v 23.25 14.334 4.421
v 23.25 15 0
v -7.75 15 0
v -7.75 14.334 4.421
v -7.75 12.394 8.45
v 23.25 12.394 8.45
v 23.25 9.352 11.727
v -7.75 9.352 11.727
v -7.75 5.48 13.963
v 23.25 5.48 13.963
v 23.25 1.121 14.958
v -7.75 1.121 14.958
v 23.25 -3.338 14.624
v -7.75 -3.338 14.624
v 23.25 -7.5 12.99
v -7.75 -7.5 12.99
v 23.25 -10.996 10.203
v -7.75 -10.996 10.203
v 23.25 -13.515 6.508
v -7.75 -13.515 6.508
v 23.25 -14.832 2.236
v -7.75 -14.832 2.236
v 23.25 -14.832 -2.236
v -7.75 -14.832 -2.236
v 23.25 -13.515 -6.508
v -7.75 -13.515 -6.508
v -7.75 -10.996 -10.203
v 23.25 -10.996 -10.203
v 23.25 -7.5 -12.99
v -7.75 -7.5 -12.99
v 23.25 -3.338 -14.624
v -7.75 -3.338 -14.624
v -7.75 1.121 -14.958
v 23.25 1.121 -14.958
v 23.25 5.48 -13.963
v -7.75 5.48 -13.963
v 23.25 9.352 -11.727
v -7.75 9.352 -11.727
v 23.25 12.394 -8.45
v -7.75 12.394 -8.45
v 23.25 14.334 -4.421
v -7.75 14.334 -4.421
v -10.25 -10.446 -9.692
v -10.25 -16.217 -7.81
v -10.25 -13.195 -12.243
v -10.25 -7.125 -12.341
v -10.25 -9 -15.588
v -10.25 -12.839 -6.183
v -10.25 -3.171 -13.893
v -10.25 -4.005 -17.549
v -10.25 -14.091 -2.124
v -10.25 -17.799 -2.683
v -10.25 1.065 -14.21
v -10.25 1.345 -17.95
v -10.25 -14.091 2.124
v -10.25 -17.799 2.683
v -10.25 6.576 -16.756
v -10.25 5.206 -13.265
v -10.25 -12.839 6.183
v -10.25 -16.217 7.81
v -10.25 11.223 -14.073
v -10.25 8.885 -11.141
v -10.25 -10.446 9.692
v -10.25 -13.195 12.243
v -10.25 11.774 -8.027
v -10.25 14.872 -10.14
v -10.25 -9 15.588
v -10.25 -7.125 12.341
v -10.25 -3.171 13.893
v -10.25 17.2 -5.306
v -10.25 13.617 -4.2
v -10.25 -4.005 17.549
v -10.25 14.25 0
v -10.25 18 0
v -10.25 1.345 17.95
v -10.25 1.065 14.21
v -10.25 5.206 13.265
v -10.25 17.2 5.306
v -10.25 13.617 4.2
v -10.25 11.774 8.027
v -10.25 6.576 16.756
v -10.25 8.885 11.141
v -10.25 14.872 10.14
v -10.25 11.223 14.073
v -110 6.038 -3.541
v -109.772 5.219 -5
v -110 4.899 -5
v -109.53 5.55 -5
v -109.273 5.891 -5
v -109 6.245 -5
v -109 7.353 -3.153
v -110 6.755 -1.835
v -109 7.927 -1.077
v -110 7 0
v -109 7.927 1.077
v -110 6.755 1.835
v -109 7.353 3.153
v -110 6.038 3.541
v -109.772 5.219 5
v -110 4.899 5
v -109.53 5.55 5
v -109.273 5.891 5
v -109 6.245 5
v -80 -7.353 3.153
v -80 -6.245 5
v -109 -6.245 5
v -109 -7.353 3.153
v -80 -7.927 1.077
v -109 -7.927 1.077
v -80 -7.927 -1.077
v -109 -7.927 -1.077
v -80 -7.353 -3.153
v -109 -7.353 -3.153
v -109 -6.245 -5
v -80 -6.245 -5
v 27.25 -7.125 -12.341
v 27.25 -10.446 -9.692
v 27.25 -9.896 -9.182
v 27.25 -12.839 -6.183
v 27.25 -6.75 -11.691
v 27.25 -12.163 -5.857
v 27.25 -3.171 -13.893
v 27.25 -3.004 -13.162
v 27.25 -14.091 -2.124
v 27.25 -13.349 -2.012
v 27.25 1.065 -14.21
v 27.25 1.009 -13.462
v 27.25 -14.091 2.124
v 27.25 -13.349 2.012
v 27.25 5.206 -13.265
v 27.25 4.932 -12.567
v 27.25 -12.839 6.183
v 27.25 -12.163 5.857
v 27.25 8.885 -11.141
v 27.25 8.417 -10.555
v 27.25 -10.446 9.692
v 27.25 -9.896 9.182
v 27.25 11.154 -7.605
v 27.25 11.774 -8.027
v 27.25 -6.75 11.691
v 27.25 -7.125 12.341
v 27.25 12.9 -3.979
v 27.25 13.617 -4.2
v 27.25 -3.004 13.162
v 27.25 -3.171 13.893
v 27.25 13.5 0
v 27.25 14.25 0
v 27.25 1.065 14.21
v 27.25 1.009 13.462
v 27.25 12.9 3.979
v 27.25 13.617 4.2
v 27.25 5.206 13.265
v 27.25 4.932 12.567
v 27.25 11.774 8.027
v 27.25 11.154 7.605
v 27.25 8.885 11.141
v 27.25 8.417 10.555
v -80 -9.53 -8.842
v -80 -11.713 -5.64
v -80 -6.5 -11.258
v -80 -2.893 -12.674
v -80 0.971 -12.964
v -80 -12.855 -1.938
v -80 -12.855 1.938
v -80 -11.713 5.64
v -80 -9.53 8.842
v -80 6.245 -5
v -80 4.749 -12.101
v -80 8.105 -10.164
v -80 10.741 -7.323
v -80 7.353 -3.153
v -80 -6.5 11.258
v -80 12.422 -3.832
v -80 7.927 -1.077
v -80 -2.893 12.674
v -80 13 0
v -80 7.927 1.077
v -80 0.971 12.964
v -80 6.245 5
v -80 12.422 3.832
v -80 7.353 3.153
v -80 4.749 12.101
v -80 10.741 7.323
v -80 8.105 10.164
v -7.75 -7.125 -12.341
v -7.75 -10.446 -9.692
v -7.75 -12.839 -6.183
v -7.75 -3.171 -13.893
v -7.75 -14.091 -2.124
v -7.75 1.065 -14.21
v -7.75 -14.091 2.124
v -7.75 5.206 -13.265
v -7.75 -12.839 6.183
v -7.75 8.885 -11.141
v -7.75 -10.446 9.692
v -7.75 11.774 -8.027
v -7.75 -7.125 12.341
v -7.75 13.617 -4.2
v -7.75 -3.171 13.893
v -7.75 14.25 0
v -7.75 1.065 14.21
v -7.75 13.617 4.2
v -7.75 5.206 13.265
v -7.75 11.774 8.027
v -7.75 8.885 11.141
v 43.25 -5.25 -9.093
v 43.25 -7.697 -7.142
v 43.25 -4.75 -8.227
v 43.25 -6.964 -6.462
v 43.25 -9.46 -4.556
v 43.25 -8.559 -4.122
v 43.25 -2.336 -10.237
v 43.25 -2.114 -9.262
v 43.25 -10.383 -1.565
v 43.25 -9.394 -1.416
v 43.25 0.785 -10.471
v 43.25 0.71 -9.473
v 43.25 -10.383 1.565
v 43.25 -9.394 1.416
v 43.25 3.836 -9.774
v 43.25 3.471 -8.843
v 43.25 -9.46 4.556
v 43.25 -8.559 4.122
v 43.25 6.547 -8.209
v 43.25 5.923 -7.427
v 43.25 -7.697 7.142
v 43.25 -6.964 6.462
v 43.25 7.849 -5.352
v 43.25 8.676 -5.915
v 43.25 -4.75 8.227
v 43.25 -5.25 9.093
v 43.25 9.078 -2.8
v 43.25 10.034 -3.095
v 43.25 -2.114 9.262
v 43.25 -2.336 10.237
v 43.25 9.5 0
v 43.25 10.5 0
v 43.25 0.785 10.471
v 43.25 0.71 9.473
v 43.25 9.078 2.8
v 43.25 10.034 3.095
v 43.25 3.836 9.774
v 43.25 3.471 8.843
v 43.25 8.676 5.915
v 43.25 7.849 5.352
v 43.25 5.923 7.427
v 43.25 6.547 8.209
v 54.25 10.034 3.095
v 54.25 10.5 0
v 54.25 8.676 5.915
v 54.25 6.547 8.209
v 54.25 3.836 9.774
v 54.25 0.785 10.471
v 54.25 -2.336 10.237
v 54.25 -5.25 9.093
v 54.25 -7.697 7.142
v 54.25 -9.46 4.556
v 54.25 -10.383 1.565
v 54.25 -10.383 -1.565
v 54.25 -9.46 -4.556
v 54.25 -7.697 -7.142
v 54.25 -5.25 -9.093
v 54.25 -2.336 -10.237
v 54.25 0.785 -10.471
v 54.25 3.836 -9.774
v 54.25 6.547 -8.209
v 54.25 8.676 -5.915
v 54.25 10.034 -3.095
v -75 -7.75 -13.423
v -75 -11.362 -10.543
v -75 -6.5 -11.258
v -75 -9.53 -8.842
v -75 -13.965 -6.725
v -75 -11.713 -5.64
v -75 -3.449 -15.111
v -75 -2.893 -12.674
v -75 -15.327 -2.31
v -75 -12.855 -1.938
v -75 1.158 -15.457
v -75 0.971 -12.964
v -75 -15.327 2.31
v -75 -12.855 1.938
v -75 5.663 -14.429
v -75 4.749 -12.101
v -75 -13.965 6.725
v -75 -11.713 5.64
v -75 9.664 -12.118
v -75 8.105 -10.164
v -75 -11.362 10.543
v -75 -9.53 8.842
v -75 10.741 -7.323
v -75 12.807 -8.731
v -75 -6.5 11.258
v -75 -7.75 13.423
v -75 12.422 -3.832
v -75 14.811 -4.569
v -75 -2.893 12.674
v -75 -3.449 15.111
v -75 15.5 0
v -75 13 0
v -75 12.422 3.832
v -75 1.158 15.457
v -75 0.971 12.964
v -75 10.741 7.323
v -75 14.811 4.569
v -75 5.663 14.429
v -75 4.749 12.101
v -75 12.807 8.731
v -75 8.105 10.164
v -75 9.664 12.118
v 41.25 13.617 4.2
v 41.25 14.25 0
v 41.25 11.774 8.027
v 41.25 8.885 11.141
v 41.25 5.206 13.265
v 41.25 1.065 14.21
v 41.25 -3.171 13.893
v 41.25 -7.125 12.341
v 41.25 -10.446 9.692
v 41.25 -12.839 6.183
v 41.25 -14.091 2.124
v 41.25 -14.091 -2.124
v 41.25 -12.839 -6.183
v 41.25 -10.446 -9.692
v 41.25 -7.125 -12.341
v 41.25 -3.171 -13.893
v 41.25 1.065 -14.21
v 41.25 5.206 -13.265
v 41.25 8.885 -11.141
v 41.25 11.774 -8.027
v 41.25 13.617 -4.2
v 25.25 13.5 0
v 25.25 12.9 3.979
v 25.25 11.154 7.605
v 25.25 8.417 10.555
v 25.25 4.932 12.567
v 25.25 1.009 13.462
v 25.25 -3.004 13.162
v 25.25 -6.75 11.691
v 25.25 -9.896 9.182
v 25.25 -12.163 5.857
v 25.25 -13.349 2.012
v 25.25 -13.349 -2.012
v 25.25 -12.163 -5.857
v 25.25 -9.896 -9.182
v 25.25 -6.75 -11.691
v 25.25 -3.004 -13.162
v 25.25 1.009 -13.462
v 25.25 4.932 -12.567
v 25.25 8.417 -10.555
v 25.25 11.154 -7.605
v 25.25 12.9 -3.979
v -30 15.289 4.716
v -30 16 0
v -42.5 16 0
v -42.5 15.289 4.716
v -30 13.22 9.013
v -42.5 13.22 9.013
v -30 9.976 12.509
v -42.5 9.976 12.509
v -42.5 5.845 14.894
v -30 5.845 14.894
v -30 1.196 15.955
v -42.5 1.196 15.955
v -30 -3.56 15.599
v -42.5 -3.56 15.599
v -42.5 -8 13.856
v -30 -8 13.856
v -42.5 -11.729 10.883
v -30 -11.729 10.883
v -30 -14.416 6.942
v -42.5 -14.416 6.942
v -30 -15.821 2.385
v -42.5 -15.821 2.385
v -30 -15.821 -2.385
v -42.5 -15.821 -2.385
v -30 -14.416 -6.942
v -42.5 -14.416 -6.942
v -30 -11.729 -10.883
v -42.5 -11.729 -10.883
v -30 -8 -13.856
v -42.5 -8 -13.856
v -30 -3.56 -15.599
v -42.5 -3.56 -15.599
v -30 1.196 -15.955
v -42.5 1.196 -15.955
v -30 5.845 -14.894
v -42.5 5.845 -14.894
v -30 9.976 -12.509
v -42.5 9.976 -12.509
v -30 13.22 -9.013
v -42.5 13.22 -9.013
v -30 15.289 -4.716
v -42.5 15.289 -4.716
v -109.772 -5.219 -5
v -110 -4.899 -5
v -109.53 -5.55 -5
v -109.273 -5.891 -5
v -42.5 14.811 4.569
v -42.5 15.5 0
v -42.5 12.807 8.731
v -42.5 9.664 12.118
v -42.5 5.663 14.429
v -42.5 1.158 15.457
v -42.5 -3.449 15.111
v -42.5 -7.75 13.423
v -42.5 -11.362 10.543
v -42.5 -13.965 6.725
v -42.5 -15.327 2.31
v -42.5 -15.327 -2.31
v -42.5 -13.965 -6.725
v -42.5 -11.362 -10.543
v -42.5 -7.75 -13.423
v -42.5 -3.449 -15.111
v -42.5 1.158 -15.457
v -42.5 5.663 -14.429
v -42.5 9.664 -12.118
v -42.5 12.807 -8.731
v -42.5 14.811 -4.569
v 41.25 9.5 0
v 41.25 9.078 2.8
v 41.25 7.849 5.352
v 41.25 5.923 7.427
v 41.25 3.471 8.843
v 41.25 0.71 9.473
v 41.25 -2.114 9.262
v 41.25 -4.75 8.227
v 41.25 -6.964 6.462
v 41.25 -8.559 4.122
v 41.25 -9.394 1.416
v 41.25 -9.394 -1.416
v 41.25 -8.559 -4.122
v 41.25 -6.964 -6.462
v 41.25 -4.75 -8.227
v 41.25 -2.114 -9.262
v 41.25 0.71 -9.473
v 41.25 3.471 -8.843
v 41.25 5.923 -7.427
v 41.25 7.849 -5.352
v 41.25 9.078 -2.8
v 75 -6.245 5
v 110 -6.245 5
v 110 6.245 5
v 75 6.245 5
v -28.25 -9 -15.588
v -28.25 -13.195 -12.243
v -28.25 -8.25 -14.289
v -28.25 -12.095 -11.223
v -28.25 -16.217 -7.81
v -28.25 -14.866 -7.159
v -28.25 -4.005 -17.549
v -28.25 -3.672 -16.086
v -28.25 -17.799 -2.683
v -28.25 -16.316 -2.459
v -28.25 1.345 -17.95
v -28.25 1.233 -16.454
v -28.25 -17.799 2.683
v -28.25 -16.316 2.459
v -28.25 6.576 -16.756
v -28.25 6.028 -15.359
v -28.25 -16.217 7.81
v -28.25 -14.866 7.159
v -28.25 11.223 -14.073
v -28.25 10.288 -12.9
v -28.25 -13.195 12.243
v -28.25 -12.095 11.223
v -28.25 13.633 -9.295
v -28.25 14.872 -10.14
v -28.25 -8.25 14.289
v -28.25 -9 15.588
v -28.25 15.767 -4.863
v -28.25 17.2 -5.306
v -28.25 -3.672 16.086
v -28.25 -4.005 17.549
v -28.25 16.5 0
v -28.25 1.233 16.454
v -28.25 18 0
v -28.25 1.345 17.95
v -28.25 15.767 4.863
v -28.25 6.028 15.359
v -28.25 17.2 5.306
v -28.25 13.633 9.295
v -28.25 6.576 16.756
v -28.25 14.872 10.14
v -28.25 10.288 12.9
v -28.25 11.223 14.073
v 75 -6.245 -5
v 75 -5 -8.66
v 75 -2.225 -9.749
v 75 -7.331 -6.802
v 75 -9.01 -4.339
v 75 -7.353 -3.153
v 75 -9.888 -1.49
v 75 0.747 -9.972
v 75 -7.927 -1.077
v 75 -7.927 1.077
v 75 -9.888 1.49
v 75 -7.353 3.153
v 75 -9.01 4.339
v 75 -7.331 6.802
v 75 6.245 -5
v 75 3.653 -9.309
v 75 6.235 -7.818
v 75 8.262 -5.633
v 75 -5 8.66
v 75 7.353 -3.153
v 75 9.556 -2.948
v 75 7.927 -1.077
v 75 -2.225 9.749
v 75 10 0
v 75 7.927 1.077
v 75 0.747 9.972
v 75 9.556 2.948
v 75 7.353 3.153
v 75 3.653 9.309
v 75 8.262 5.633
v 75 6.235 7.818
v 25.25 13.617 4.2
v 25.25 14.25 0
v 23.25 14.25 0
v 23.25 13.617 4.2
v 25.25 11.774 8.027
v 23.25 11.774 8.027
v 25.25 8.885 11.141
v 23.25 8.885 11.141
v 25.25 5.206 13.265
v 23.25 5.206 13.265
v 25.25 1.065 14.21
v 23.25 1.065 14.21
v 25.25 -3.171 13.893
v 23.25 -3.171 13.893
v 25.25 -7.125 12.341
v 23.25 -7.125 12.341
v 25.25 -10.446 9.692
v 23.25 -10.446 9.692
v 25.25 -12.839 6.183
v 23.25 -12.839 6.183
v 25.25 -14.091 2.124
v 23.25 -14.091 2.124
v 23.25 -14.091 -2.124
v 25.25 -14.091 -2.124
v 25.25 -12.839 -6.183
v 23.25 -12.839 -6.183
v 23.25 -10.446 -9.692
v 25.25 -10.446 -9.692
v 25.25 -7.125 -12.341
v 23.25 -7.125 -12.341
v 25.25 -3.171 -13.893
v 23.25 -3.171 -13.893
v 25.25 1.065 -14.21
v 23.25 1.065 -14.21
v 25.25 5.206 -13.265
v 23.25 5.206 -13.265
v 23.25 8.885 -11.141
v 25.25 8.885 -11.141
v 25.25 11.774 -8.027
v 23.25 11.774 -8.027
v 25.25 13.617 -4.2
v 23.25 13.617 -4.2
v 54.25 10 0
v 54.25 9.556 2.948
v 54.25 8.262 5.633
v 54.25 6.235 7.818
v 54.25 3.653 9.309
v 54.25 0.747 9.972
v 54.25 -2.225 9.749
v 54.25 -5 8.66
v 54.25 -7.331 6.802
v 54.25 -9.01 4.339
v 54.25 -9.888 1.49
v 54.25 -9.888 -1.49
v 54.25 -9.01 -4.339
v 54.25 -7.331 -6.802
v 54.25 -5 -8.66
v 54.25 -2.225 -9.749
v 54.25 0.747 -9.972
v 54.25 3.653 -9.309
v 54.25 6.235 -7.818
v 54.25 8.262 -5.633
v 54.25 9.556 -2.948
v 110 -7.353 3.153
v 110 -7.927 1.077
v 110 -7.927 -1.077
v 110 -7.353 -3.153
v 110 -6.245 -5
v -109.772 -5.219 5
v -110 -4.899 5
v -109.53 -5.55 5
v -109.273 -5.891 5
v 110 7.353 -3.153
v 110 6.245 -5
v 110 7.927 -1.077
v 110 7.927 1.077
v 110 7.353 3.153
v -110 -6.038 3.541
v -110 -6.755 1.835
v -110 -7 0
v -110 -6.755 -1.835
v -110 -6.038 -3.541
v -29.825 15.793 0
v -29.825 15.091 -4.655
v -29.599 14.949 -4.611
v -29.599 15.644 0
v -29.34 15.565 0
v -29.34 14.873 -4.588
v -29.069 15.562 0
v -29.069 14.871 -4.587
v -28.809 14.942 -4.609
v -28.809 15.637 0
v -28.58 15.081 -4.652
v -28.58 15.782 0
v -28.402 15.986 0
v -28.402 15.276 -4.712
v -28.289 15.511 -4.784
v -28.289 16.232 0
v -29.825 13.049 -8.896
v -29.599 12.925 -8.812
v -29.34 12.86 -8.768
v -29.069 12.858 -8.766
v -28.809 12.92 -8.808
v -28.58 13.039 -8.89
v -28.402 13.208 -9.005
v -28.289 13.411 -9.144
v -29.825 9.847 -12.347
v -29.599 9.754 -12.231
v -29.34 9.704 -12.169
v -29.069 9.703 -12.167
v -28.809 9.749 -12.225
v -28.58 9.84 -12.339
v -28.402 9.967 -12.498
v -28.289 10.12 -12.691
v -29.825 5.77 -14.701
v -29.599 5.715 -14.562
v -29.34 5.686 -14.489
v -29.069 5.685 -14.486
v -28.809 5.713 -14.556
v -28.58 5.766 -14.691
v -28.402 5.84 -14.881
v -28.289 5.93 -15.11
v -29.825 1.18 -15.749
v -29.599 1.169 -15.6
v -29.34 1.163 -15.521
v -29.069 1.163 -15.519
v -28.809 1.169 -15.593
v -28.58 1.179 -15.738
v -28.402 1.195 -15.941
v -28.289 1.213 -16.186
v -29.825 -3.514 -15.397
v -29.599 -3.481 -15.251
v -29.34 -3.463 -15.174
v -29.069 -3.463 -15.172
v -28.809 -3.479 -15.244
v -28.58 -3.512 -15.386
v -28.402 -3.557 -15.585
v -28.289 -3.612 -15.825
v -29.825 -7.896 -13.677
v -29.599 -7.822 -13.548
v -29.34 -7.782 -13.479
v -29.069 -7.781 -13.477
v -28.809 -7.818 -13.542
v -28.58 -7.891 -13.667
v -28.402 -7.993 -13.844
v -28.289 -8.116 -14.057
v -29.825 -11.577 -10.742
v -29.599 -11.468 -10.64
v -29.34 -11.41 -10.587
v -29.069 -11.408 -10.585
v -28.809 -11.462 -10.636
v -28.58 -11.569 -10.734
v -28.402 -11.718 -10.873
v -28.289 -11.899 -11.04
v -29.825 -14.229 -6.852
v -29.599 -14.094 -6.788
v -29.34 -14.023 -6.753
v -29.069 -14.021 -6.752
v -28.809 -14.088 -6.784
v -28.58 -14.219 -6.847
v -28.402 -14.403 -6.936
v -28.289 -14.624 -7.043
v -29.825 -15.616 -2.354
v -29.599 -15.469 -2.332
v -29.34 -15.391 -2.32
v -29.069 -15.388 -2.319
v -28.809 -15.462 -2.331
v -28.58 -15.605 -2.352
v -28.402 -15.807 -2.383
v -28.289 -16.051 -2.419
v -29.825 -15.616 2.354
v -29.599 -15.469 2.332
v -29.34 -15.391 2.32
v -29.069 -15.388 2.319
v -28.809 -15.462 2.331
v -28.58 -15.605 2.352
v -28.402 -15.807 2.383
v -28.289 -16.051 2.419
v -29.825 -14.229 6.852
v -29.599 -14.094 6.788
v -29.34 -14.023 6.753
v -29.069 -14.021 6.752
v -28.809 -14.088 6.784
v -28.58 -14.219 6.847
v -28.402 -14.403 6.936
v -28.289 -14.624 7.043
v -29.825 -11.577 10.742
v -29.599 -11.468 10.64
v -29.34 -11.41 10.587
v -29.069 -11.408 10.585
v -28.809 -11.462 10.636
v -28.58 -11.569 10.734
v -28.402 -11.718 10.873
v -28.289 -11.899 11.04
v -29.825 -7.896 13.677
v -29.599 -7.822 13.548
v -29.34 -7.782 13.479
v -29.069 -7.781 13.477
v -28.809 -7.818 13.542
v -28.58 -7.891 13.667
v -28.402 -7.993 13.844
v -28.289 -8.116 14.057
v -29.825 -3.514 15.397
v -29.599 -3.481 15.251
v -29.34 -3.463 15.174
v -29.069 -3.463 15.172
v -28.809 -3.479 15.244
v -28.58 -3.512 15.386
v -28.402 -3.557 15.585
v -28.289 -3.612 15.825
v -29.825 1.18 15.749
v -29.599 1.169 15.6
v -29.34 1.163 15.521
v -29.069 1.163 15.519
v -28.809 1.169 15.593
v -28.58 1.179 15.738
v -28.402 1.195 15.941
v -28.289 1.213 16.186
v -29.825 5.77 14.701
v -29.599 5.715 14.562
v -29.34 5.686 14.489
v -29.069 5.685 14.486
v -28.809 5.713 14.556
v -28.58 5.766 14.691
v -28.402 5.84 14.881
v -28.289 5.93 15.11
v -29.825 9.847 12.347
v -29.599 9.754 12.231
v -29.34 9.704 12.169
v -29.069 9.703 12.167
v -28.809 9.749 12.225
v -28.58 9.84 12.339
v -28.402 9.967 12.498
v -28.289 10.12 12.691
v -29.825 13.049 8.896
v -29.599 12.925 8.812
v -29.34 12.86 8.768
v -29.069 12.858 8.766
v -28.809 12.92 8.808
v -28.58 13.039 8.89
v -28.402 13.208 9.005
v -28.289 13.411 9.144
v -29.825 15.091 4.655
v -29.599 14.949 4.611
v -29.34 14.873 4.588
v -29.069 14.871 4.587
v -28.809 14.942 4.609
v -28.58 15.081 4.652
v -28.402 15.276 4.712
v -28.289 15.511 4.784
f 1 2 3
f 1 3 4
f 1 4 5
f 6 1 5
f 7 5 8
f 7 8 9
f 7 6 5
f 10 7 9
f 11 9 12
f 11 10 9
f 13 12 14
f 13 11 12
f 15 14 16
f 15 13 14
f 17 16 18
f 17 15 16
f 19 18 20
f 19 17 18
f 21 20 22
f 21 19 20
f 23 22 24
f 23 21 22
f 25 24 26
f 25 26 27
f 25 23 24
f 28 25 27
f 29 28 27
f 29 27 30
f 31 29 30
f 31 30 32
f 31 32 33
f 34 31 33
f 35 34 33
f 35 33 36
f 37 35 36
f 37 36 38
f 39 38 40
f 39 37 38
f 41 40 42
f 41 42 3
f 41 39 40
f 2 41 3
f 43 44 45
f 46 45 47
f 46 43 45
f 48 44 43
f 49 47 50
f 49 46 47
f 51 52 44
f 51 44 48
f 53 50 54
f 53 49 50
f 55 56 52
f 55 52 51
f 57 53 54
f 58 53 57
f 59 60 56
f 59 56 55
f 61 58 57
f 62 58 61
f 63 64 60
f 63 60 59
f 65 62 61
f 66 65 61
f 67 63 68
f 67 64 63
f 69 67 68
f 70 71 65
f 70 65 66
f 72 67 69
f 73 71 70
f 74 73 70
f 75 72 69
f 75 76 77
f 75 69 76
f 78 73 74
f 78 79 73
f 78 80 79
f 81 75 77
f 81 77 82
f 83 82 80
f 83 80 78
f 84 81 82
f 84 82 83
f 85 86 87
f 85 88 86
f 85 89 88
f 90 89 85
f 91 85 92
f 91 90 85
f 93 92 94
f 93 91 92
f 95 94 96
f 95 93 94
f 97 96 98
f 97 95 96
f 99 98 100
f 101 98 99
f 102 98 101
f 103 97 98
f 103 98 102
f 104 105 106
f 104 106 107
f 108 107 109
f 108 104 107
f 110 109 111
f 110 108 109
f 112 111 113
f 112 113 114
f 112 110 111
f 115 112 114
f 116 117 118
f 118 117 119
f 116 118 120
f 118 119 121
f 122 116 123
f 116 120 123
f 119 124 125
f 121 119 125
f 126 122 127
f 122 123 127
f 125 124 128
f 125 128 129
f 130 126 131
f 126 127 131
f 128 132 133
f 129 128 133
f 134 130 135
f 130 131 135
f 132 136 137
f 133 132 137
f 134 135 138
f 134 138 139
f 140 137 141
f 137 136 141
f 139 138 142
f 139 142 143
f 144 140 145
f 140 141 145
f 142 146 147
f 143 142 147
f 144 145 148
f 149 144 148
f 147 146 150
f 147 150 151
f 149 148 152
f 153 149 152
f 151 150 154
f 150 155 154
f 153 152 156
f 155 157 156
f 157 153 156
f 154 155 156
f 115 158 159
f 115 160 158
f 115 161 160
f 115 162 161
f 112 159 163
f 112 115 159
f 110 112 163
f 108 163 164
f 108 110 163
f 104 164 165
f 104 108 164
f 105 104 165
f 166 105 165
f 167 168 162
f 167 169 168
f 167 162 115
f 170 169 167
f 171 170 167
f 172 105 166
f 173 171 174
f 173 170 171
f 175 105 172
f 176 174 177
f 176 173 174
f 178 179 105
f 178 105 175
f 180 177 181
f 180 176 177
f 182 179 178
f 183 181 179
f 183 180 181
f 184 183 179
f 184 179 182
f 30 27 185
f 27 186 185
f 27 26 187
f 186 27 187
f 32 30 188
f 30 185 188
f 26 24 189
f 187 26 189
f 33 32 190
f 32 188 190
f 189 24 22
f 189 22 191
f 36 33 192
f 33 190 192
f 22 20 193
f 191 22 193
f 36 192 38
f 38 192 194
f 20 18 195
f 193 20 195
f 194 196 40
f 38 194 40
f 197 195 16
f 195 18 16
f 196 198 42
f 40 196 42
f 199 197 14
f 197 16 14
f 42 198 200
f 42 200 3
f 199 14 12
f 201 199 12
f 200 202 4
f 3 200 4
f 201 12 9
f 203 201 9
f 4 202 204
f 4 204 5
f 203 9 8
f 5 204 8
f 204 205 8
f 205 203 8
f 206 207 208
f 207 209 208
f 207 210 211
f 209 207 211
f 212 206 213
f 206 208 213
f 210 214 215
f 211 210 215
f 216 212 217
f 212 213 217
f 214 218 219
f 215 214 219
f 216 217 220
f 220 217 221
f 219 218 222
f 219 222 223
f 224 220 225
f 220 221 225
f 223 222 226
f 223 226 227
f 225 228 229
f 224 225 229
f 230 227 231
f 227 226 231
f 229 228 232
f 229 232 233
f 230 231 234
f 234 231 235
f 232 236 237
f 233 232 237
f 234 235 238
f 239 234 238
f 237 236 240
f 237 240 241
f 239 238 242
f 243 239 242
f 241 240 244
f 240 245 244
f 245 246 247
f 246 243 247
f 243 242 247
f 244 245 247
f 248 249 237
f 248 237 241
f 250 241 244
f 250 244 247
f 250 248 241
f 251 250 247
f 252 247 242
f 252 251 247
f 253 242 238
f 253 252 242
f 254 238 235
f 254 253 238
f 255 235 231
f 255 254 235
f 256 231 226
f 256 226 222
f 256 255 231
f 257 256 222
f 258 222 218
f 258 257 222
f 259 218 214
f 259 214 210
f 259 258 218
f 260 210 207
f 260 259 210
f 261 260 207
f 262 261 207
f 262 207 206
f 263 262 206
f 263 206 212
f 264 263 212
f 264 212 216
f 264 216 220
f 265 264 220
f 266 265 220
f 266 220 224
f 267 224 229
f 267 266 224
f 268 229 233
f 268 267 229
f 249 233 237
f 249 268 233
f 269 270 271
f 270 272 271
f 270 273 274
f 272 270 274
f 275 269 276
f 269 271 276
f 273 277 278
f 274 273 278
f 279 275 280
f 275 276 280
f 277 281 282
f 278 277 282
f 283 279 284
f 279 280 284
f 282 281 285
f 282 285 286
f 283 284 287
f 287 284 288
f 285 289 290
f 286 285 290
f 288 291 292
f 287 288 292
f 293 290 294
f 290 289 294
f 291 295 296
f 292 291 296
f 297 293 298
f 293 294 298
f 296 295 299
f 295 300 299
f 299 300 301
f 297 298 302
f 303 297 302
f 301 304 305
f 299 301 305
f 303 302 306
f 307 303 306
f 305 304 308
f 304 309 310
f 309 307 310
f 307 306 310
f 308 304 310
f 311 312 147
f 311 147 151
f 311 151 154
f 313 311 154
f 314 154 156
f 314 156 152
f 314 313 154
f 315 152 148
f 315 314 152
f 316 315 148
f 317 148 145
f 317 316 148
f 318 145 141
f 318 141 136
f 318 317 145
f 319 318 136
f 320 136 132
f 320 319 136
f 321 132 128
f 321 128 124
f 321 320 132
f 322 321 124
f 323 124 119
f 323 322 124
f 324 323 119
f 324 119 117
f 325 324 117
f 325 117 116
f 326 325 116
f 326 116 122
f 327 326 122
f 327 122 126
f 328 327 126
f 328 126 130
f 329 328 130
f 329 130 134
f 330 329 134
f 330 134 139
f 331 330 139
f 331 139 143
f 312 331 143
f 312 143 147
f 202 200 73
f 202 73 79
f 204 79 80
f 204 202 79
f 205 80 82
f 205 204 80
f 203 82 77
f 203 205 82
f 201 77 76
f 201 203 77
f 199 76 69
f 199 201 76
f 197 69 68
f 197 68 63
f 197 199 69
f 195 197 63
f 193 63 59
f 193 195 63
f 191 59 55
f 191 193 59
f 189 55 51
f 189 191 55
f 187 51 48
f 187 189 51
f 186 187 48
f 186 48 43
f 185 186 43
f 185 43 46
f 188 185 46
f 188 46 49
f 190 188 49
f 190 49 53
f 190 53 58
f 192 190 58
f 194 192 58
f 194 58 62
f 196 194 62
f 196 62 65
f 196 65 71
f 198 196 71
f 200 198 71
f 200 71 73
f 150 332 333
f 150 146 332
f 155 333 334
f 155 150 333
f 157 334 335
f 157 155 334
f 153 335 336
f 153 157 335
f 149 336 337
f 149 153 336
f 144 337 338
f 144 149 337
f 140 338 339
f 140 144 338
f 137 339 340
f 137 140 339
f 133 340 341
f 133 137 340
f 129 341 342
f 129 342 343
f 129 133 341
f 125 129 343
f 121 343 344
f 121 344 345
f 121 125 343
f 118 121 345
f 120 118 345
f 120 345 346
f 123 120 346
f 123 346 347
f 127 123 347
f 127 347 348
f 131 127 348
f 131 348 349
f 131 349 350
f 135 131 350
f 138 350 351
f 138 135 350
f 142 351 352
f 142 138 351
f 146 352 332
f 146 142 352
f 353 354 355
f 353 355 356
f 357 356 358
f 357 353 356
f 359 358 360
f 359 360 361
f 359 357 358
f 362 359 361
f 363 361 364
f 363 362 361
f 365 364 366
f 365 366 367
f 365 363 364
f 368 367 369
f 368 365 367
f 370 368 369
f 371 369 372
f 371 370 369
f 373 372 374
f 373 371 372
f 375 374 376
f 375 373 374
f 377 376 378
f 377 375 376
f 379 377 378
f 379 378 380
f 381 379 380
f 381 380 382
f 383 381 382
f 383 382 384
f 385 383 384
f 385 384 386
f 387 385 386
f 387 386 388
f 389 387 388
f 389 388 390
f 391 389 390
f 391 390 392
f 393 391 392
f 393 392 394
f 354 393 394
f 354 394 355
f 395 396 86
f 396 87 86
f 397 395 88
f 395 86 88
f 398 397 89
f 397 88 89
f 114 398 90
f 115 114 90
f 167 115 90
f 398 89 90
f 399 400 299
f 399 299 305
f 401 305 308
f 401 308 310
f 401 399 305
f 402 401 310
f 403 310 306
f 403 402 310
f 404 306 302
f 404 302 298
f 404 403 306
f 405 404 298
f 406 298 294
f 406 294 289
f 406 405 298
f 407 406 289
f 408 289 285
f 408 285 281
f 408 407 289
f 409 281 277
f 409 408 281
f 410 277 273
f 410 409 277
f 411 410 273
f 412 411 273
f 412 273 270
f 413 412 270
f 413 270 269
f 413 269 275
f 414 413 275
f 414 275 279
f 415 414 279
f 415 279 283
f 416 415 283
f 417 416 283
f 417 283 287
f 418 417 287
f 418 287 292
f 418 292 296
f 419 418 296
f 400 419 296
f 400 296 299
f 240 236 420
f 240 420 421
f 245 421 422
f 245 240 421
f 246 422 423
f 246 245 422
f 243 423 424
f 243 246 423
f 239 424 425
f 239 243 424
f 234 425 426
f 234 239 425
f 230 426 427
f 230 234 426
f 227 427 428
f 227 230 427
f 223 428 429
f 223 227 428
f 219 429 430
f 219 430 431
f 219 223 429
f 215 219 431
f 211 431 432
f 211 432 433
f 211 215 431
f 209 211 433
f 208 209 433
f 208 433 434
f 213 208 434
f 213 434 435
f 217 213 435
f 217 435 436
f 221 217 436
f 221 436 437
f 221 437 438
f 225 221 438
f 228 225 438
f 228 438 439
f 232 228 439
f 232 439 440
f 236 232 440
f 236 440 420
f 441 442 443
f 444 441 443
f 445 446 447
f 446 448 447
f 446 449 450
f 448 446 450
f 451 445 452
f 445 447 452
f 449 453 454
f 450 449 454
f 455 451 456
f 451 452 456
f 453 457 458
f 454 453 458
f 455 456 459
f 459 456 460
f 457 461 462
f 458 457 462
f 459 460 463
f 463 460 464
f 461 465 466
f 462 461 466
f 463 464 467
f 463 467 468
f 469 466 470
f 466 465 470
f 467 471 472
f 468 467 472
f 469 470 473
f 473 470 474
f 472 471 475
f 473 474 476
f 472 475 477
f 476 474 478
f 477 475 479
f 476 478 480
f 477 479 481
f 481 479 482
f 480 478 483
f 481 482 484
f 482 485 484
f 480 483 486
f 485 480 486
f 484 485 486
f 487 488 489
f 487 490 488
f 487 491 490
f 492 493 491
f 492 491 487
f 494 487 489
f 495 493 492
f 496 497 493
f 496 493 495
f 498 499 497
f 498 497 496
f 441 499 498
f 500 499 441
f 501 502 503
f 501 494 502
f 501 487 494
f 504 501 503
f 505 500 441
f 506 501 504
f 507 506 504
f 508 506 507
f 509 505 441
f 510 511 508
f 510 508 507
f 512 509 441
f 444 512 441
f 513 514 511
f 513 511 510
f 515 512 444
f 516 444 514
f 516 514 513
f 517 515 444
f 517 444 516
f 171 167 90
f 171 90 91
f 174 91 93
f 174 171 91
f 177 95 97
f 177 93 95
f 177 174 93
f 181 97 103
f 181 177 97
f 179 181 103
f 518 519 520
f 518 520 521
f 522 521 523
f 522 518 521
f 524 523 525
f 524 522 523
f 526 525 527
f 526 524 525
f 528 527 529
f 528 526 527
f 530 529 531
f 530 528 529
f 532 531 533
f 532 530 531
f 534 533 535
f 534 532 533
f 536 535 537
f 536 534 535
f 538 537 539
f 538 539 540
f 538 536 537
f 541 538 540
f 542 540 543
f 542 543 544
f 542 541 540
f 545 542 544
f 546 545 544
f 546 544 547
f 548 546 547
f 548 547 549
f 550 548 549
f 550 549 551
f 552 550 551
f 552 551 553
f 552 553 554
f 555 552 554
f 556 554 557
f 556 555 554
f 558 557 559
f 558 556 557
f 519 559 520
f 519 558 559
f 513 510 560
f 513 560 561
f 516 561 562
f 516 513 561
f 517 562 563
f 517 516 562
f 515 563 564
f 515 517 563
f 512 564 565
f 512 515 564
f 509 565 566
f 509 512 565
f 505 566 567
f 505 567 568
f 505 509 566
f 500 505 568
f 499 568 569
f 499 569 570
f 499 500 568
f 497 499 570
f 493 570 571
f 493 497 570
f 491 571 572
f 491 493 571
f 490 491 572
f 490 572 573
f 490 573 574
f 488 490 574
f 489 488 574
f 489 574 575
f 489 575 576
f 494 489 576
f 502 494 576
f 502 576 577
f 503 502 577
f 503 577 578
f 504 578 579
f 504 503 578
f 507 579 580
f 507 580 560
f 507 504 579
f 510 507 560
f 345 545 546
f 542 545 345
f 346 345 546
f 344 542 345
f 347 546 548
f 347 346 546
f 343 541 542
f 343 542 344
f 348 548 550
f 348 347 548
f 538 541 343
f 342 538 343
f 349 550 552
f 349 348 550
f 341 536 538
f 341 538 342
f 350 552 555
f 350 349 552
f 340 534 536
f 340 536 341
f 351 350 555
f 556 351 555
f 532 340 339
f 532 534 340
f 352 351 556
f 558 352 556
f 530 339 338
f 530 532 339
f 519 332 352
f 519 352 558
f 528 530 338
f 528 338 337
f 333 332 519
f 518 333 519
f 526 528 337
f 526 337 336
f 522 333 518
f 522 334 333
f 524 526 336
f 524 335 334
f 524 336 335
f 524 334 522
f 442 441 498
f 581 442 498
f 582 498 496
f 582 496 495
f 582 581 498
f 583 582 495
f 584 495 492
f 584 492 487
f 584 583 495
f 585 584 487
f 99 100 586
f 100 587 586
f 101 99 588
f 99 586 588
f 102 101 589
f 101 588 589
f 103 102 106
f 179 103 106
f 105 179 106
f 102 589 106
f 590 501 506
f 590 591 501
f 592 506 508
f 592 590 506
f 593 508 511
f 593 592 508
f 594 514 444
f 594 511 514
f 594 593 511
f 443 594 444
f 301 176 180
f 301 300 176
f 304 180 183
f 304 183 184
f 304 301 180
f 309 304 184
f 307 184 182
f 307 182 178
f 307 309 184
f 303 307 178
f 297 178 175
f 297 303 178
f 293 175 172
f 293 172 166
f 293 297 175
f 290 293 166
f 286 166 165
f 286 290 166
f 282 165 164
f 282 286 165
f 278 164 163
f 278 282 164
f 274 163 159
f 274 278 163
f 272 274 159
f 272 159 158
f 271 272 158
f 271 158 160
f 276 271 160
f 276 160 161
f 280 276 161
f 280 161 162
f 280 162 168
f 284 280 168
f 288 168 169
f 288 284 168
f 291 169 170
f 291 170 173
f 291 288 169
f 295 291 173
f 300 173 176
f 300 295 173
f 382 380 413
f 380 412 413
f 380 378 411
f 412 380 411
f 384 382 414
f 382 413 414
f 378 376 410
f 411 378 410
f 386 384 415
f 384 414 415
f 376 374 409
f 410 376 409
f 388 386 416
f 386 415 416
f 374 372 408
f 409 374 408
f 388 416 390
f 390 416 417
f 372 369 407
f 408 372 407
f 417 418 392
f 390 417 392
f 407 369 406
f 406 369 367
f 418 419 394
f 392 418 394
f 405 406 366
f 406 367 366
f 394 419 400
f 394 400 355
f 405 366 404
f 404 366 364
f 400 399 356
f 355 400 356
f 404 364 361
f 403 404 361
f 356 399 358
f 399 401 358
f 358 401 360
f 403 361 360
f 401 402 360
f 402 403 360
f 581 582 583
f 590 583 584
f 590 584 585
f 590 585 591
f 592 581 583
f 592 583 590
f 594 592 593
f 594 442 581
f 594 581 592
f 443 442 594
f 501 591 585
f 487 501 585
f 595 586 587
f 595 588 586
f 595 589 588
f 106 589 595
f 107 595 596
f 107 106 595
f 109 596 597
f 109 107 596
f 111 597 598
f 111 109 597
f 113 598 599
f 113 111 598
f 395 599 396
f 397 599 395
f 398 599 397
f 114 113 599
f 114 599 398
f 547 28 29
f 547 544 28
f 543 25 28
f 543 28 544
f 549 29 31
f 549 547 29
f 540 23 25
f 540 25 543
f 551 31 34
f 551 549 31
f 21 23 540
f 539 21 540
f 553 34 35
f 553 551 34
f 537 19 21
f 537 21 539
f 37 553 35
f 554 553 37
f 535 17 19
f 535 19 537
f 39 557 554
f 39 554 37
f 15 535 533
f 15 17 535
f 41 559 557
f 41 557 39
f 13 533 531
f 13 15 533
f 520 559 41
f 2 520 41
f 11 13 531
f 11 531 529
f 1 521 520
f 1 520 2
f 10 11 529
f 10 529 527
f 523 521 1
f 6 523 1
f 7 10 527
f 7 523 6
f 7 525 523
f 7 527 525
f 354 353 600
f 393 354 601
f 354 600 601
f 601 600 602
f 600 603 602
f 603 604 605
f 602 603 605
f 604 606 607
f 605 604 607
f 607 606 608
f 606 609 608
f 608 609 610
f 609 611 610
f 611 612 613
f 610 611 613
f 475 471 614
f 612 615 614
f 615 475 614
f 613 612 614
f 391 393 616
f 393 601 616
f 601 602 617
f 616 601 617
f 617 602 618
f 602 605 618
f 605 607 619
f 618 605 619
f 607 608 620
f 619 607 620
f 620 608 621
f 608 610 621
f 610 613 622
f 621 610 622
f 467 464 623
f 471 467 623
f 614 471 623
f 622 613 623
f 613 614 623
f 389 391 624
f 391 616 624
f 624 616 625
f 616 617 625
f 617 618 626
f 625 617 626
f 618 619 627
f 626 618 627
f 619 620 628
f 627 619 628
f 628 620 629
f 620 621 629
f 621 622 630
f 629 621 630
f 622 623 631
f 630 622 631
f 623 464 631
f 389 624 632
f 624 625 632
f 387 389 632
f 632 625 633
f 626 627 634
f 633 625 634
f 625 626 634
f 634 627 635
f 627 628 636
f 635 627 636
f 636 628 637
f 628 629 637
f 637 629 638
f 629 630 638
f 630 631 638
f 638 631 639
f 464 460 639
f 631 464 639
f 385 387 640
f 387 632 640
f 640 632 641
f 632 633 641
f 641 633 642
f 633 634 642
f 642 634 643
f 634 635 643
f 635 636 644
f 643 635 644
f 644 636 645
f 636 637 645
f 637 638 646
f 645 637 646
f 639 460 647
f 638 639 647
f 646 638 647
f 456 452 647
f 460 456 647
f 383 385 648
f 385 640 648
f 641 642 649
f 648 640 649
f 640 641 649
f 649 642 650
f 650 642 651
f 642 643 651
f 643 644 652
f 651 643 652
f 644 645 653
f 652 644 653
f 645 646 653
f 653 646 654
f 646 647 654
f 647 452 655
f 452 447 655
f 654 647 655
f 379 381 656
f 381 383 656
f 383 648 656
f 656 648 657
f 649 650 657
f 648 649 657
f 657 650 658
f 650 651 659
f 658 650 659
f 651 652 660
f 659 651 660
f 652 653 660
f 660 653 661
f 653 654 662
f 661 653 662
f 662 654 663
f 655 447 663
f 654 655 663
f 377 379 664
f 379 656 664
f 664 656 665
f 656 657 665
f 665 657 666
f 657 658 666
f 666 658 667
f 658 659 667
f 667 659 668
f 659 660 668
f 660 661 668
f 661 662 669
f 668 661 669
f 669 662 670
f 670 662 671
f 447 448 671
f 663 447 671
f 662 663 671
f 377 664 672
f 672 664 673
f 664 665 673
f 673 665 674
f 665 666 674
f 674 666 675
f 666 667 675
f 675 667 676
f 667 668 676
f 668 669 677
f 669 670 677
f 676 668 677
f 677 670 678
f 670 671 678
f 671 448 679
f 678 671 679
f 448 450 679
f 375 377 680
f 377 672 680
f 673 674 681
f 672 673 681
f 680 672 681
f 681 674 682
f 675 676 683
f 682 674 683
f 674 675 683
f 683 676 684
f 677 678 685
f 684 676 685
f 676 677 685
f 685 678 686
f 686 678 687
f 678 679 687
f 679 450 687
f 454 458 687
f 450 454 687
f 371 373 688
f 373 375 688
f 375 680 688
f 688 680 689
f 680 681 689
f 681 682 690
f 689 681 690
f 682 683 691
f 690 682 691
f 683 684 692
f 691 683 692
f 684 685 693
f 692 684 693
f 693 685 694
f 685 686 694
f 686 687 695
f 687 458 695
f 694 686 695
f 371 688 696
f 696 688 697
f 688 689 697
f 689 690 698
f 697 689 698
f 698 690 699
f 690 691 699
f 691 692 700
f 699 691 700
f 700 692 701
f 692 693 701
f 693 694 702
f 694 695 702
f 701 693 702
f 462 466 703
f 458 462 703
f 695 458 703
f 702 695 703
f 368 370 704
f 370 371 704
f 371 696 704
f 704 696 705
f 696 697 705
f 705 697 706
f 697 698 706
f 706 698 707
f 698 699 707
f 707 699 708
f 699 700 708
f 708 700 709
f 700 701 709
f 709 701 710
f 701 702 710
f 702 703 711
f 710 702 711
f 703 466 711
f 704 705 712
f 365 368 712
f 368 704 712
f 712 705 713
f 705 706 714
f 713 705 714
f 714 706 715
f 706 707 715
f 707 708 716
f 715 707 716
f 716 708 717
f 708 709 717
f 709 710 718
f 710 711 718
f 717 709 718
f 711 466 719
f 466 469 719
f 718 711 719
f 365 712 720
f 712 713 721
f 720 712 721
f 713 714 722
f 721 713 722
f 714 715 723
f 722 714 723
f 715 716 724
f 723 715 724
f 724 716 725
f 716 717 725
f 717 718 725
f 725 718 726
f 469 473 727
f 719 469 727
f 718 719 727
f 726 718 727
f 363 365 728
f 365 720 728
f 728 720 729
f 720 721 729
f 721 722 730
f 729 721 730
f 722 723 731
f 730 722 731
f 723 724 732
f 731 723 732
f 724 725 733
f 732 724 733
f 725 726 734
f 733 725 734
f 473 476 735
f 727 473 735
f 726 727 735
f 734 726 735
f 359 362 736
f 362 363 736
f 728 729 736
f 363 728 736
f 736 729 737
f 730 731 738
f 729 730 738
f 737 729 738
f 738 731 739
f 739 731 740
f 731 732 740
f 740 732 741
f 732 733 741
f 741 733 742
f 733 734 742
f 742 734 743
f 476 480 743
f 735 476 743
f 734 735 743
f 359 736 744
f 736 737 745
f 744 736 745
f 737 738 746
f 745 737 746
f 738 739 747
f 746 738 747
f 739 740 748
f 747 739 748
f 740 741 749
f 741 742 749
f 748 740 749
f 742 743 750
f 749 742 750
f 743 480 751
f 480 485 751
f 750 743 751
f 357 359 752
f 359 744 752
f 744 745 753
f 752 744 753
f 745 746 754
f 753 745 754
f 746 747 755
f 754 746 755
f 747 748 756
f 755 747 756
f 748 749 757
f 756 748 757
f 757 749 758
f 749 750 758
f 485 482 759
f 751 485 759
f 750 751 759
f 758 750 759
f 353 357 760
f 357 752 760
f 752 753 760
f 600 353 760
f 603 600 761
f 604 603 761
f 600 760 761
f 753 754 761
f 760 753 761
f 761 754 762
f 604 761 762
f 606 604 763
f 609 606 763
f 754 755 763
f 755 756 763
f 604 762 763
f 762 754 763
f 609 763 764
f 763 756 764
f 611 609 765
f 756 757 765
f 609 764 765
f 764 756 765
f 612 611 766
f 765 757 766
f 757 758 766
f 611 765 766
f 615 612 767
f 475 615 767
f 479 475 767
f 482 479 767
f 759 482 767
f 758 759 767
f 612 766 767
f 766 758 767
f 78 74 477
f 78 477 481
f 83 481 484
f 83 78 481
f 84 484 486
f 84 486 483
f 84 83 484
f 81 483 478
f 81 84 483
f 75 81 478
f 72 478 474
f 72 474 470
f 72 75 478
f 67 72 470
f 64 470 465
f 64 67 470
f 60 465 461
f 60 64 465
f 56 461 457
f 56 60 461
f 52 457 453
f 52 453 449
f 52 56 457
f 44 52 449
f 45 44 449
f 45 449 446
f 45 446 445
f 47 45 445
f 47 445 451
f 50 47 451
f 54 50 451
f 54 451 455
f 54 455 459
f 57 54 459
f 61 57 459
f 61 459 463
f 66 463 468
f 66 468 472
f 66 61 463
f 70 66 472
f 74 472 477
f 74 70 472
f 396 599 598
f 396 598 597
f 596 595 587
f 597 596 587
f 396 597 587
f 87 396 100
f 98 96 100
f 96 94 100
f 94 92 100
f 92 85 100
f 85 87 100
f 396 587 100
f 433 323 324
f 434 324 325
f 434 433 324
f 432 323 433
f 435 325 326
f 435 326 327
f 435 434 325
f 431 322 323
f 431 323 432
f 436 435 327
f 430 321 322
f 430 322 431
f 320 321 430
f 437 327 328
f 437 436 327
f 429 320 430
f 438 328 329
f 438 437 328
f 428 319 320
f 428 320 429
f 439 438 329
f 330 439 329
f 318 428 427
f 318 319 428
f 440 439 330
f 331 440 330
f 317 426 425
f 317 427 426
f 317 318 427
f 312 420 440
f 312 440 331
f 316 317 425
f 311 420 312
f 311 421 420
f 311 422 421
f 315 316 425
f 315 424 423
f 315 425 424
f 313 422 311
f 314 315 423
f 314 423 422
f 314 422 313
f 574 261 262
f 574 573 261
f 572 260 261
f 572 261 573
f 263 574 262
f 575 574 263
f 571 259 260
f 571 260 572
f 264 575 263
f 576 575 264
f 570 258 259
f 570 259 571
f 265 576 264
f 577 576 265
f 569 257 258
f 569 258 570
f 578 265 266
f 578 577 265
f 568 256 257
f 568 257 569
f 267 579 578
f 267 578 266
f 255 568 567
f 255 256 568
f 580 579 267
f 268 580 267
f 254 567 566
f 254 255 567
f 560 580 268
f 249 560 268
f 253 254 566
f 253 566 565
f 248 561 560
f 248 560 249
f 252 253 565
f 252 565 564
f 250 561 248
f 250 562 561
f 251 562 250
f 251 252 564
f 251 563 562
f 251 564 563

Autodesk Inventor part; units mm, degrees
ref_plane "YZ Plane" through (0, 0, 0) normal (1, 0, 0) x (0, 1, 0)
ref_plane "XZ Plane" through (0, 0, 0) normal (0, 1, 0) x (-1, 0, 0)
ref_plane "XY Plane" through (0, 0, 0) normal (0, 0, 1) x (1, 0, 0)
sketch "Esquisse1" plane through (0, 0, 0) normal (0, 0, 1) x (1, 0, 0)
  line L0 (-110, 0) -> (-110, 7)
  line L1 (-110, 7) -> (-109, 8)
  line L2 (-109, 8) -> (-80, 8)
  line L3 (-80, 8) -> (-80, 13)
  line L4 (-80, 13) -> (-75, 13)
  line L5 (-75, 13) -> (-75, 15.5)
  line L6 (-75, 15.5) -> (-42.5, 15.5)
  line L7 (-110, 0) -> (110, 0)
  line L8 (-42.5, 15.5) -> (-42.5, 16)
  line L9 (-42.5, 16) -> (-30, 16)
  arc A0 (-30, 16) -> (-28.25, 16.5) centre (-29.1964, 16.5) ccw
  line L10 (-28.25, 16.5) -> (-28.25, 18)
  line L11 (-28.25, 18) -> (-10.25, 18)
  line L12 (-10.25, 18) -> (-10.25, 14.25)
  line L13 (-10.25, 14.25) -> (-7.75, 14.25)
  line L14 (-7.75, 14.25) -> (-7.75, 15)
  line L15 (-7.75, 15) -> (23.25, 15)
  line L16 (23.25, 15) -> (23.25, 14.25)
  line L17 (23.25, 14.25) -> (25.25, 14.25)
  line L18 (25.25, 14.25) -> (25.25, 13.5)
  line L19 (25.25, 13.5) -> (27.25, 13.5)
  line L20 (27.25, 13.5) -> (27.25, 14.25)
  line L21 (27.25, 14.25) -> (41.25, 14.25)
  line L22 (41.25, 14.25) -> (41.25, 9.5)
  line L23 (41.25, 9.5) -> (43.25, 9.5)
  line L24 (43.25, 9.5) -> (43.25, 10.5)
  line L25 (43.25, 10.5) -> (54.25, 10.5)
  line L26 (54.25, 10.5) -> (54.25, 10)
  line L27 (54.25, 10) -> (75, 10)
  line L28 (75, 10) -> (75, 8)
  line L29 (75, 8) -> (110, 8)
  line L30 (110, 8) -> (110, 0)
  point P0 (0, 0)
  dimension "d0" = 35
  dimension "d1" = 1
  dimension "d2" = 1
  dimension "d3" = 8
  dimension "d4" = 30
  dimension "d5" = 13
  dimension "d6" = 15.5
  dimension "d7" = 16
  dimension "d8" = 32.5
  dimension "d9" = 12.5
  dimension "d10" = 14.25
  dimension "d11" = 0.5
  dimension "d12" = 18
  dimension "d13" = 18
  dimension "d14" = 14.25
  dimension "d15" = 2.5
  dimension "d16" = 75
  dimension "d17" = 15
  dimension "d18" = 31
  dimension "d19" = 2
  dimension "d20" = 2
  dimension "d21" = 14.25
  dimension "d22" = 13.5
  dimension "d23" = 14.25
  dimension "d24" = 14
  dimension "d25" = 9.5
  dimension "d26" = 2
  dimension "d27" = 75
  dimension "d28" = 10.5
  dimension "d29" = 11
  dimension "d30" = 10
  dimension "d31" = 220
  dimension "d32" = 8
revolve "Révolution1" add sketch "Esquisse1" angle 360 about axis through (-110, 0, 0) along (1, 0, 0)
thread "Filetage1" size "M16x1.5" class "6g" standard "ISO Metric profile" full length
sketch "Esquisse2" plane through (-110, 0, 0) normal (-1, 0, 0) x (0, 0, 1)
  circle A0 centre (0, 0) radius 9.5 projected
  line L0 (5, -8.0777) -> (-5, -8.0777)
  line L1 (-5, -8.0777) -> (-5, 8.0777)
  line L2 (-5, 8.0777) -> (5, 8.0777)
  line L3 (5, 8.0777) -> (5, -8.0777)
  line L4 (5, -8.0777) -> (-5, 8.0777) construction
  line L5 (-5, -8.0777) -> (5, 8.0777) construction
  dimension "d34" = 10
extrude "Extrusion1" cut sketch "Esquisse2" against normal up to surface (30 mm away) contours A0 L3 | L2 A0 | A0 L0 | L1 A0
thread "Filetage4" size "M16x1.5" class "6g" standard "ISO Metric profile" full length
sketch "Esquisse3" plane through (110, 0, 0) normal (1, 0, 0) x (0, 0, -1)
  line L0 (5, -8.6603) -> (-5, -8.6603)
  line L1 (-5, -8.6603) -> (-5, 8.6603)
  line L2 (-5, 8.6603) -> (5, 8.6603)
  line L3 (5, 8.6603) -> (5, -8.6603)
  line L4 (5, -8.6603) -> (-5, 8.6603) construction
  line L5 (-5, -8.6603) -> (5, 8.6603) construction
  circle A0 centre (0, 0) radius 10 projected
  dimension "d45" = 10
extrude "Extrusion2" cut sketch "Esquisse3" against normal up to surface (35 mm away) contours A0 L0 | L3 A0 | A0 L1 | L2 A0
properties part number "Stator_Axis"
